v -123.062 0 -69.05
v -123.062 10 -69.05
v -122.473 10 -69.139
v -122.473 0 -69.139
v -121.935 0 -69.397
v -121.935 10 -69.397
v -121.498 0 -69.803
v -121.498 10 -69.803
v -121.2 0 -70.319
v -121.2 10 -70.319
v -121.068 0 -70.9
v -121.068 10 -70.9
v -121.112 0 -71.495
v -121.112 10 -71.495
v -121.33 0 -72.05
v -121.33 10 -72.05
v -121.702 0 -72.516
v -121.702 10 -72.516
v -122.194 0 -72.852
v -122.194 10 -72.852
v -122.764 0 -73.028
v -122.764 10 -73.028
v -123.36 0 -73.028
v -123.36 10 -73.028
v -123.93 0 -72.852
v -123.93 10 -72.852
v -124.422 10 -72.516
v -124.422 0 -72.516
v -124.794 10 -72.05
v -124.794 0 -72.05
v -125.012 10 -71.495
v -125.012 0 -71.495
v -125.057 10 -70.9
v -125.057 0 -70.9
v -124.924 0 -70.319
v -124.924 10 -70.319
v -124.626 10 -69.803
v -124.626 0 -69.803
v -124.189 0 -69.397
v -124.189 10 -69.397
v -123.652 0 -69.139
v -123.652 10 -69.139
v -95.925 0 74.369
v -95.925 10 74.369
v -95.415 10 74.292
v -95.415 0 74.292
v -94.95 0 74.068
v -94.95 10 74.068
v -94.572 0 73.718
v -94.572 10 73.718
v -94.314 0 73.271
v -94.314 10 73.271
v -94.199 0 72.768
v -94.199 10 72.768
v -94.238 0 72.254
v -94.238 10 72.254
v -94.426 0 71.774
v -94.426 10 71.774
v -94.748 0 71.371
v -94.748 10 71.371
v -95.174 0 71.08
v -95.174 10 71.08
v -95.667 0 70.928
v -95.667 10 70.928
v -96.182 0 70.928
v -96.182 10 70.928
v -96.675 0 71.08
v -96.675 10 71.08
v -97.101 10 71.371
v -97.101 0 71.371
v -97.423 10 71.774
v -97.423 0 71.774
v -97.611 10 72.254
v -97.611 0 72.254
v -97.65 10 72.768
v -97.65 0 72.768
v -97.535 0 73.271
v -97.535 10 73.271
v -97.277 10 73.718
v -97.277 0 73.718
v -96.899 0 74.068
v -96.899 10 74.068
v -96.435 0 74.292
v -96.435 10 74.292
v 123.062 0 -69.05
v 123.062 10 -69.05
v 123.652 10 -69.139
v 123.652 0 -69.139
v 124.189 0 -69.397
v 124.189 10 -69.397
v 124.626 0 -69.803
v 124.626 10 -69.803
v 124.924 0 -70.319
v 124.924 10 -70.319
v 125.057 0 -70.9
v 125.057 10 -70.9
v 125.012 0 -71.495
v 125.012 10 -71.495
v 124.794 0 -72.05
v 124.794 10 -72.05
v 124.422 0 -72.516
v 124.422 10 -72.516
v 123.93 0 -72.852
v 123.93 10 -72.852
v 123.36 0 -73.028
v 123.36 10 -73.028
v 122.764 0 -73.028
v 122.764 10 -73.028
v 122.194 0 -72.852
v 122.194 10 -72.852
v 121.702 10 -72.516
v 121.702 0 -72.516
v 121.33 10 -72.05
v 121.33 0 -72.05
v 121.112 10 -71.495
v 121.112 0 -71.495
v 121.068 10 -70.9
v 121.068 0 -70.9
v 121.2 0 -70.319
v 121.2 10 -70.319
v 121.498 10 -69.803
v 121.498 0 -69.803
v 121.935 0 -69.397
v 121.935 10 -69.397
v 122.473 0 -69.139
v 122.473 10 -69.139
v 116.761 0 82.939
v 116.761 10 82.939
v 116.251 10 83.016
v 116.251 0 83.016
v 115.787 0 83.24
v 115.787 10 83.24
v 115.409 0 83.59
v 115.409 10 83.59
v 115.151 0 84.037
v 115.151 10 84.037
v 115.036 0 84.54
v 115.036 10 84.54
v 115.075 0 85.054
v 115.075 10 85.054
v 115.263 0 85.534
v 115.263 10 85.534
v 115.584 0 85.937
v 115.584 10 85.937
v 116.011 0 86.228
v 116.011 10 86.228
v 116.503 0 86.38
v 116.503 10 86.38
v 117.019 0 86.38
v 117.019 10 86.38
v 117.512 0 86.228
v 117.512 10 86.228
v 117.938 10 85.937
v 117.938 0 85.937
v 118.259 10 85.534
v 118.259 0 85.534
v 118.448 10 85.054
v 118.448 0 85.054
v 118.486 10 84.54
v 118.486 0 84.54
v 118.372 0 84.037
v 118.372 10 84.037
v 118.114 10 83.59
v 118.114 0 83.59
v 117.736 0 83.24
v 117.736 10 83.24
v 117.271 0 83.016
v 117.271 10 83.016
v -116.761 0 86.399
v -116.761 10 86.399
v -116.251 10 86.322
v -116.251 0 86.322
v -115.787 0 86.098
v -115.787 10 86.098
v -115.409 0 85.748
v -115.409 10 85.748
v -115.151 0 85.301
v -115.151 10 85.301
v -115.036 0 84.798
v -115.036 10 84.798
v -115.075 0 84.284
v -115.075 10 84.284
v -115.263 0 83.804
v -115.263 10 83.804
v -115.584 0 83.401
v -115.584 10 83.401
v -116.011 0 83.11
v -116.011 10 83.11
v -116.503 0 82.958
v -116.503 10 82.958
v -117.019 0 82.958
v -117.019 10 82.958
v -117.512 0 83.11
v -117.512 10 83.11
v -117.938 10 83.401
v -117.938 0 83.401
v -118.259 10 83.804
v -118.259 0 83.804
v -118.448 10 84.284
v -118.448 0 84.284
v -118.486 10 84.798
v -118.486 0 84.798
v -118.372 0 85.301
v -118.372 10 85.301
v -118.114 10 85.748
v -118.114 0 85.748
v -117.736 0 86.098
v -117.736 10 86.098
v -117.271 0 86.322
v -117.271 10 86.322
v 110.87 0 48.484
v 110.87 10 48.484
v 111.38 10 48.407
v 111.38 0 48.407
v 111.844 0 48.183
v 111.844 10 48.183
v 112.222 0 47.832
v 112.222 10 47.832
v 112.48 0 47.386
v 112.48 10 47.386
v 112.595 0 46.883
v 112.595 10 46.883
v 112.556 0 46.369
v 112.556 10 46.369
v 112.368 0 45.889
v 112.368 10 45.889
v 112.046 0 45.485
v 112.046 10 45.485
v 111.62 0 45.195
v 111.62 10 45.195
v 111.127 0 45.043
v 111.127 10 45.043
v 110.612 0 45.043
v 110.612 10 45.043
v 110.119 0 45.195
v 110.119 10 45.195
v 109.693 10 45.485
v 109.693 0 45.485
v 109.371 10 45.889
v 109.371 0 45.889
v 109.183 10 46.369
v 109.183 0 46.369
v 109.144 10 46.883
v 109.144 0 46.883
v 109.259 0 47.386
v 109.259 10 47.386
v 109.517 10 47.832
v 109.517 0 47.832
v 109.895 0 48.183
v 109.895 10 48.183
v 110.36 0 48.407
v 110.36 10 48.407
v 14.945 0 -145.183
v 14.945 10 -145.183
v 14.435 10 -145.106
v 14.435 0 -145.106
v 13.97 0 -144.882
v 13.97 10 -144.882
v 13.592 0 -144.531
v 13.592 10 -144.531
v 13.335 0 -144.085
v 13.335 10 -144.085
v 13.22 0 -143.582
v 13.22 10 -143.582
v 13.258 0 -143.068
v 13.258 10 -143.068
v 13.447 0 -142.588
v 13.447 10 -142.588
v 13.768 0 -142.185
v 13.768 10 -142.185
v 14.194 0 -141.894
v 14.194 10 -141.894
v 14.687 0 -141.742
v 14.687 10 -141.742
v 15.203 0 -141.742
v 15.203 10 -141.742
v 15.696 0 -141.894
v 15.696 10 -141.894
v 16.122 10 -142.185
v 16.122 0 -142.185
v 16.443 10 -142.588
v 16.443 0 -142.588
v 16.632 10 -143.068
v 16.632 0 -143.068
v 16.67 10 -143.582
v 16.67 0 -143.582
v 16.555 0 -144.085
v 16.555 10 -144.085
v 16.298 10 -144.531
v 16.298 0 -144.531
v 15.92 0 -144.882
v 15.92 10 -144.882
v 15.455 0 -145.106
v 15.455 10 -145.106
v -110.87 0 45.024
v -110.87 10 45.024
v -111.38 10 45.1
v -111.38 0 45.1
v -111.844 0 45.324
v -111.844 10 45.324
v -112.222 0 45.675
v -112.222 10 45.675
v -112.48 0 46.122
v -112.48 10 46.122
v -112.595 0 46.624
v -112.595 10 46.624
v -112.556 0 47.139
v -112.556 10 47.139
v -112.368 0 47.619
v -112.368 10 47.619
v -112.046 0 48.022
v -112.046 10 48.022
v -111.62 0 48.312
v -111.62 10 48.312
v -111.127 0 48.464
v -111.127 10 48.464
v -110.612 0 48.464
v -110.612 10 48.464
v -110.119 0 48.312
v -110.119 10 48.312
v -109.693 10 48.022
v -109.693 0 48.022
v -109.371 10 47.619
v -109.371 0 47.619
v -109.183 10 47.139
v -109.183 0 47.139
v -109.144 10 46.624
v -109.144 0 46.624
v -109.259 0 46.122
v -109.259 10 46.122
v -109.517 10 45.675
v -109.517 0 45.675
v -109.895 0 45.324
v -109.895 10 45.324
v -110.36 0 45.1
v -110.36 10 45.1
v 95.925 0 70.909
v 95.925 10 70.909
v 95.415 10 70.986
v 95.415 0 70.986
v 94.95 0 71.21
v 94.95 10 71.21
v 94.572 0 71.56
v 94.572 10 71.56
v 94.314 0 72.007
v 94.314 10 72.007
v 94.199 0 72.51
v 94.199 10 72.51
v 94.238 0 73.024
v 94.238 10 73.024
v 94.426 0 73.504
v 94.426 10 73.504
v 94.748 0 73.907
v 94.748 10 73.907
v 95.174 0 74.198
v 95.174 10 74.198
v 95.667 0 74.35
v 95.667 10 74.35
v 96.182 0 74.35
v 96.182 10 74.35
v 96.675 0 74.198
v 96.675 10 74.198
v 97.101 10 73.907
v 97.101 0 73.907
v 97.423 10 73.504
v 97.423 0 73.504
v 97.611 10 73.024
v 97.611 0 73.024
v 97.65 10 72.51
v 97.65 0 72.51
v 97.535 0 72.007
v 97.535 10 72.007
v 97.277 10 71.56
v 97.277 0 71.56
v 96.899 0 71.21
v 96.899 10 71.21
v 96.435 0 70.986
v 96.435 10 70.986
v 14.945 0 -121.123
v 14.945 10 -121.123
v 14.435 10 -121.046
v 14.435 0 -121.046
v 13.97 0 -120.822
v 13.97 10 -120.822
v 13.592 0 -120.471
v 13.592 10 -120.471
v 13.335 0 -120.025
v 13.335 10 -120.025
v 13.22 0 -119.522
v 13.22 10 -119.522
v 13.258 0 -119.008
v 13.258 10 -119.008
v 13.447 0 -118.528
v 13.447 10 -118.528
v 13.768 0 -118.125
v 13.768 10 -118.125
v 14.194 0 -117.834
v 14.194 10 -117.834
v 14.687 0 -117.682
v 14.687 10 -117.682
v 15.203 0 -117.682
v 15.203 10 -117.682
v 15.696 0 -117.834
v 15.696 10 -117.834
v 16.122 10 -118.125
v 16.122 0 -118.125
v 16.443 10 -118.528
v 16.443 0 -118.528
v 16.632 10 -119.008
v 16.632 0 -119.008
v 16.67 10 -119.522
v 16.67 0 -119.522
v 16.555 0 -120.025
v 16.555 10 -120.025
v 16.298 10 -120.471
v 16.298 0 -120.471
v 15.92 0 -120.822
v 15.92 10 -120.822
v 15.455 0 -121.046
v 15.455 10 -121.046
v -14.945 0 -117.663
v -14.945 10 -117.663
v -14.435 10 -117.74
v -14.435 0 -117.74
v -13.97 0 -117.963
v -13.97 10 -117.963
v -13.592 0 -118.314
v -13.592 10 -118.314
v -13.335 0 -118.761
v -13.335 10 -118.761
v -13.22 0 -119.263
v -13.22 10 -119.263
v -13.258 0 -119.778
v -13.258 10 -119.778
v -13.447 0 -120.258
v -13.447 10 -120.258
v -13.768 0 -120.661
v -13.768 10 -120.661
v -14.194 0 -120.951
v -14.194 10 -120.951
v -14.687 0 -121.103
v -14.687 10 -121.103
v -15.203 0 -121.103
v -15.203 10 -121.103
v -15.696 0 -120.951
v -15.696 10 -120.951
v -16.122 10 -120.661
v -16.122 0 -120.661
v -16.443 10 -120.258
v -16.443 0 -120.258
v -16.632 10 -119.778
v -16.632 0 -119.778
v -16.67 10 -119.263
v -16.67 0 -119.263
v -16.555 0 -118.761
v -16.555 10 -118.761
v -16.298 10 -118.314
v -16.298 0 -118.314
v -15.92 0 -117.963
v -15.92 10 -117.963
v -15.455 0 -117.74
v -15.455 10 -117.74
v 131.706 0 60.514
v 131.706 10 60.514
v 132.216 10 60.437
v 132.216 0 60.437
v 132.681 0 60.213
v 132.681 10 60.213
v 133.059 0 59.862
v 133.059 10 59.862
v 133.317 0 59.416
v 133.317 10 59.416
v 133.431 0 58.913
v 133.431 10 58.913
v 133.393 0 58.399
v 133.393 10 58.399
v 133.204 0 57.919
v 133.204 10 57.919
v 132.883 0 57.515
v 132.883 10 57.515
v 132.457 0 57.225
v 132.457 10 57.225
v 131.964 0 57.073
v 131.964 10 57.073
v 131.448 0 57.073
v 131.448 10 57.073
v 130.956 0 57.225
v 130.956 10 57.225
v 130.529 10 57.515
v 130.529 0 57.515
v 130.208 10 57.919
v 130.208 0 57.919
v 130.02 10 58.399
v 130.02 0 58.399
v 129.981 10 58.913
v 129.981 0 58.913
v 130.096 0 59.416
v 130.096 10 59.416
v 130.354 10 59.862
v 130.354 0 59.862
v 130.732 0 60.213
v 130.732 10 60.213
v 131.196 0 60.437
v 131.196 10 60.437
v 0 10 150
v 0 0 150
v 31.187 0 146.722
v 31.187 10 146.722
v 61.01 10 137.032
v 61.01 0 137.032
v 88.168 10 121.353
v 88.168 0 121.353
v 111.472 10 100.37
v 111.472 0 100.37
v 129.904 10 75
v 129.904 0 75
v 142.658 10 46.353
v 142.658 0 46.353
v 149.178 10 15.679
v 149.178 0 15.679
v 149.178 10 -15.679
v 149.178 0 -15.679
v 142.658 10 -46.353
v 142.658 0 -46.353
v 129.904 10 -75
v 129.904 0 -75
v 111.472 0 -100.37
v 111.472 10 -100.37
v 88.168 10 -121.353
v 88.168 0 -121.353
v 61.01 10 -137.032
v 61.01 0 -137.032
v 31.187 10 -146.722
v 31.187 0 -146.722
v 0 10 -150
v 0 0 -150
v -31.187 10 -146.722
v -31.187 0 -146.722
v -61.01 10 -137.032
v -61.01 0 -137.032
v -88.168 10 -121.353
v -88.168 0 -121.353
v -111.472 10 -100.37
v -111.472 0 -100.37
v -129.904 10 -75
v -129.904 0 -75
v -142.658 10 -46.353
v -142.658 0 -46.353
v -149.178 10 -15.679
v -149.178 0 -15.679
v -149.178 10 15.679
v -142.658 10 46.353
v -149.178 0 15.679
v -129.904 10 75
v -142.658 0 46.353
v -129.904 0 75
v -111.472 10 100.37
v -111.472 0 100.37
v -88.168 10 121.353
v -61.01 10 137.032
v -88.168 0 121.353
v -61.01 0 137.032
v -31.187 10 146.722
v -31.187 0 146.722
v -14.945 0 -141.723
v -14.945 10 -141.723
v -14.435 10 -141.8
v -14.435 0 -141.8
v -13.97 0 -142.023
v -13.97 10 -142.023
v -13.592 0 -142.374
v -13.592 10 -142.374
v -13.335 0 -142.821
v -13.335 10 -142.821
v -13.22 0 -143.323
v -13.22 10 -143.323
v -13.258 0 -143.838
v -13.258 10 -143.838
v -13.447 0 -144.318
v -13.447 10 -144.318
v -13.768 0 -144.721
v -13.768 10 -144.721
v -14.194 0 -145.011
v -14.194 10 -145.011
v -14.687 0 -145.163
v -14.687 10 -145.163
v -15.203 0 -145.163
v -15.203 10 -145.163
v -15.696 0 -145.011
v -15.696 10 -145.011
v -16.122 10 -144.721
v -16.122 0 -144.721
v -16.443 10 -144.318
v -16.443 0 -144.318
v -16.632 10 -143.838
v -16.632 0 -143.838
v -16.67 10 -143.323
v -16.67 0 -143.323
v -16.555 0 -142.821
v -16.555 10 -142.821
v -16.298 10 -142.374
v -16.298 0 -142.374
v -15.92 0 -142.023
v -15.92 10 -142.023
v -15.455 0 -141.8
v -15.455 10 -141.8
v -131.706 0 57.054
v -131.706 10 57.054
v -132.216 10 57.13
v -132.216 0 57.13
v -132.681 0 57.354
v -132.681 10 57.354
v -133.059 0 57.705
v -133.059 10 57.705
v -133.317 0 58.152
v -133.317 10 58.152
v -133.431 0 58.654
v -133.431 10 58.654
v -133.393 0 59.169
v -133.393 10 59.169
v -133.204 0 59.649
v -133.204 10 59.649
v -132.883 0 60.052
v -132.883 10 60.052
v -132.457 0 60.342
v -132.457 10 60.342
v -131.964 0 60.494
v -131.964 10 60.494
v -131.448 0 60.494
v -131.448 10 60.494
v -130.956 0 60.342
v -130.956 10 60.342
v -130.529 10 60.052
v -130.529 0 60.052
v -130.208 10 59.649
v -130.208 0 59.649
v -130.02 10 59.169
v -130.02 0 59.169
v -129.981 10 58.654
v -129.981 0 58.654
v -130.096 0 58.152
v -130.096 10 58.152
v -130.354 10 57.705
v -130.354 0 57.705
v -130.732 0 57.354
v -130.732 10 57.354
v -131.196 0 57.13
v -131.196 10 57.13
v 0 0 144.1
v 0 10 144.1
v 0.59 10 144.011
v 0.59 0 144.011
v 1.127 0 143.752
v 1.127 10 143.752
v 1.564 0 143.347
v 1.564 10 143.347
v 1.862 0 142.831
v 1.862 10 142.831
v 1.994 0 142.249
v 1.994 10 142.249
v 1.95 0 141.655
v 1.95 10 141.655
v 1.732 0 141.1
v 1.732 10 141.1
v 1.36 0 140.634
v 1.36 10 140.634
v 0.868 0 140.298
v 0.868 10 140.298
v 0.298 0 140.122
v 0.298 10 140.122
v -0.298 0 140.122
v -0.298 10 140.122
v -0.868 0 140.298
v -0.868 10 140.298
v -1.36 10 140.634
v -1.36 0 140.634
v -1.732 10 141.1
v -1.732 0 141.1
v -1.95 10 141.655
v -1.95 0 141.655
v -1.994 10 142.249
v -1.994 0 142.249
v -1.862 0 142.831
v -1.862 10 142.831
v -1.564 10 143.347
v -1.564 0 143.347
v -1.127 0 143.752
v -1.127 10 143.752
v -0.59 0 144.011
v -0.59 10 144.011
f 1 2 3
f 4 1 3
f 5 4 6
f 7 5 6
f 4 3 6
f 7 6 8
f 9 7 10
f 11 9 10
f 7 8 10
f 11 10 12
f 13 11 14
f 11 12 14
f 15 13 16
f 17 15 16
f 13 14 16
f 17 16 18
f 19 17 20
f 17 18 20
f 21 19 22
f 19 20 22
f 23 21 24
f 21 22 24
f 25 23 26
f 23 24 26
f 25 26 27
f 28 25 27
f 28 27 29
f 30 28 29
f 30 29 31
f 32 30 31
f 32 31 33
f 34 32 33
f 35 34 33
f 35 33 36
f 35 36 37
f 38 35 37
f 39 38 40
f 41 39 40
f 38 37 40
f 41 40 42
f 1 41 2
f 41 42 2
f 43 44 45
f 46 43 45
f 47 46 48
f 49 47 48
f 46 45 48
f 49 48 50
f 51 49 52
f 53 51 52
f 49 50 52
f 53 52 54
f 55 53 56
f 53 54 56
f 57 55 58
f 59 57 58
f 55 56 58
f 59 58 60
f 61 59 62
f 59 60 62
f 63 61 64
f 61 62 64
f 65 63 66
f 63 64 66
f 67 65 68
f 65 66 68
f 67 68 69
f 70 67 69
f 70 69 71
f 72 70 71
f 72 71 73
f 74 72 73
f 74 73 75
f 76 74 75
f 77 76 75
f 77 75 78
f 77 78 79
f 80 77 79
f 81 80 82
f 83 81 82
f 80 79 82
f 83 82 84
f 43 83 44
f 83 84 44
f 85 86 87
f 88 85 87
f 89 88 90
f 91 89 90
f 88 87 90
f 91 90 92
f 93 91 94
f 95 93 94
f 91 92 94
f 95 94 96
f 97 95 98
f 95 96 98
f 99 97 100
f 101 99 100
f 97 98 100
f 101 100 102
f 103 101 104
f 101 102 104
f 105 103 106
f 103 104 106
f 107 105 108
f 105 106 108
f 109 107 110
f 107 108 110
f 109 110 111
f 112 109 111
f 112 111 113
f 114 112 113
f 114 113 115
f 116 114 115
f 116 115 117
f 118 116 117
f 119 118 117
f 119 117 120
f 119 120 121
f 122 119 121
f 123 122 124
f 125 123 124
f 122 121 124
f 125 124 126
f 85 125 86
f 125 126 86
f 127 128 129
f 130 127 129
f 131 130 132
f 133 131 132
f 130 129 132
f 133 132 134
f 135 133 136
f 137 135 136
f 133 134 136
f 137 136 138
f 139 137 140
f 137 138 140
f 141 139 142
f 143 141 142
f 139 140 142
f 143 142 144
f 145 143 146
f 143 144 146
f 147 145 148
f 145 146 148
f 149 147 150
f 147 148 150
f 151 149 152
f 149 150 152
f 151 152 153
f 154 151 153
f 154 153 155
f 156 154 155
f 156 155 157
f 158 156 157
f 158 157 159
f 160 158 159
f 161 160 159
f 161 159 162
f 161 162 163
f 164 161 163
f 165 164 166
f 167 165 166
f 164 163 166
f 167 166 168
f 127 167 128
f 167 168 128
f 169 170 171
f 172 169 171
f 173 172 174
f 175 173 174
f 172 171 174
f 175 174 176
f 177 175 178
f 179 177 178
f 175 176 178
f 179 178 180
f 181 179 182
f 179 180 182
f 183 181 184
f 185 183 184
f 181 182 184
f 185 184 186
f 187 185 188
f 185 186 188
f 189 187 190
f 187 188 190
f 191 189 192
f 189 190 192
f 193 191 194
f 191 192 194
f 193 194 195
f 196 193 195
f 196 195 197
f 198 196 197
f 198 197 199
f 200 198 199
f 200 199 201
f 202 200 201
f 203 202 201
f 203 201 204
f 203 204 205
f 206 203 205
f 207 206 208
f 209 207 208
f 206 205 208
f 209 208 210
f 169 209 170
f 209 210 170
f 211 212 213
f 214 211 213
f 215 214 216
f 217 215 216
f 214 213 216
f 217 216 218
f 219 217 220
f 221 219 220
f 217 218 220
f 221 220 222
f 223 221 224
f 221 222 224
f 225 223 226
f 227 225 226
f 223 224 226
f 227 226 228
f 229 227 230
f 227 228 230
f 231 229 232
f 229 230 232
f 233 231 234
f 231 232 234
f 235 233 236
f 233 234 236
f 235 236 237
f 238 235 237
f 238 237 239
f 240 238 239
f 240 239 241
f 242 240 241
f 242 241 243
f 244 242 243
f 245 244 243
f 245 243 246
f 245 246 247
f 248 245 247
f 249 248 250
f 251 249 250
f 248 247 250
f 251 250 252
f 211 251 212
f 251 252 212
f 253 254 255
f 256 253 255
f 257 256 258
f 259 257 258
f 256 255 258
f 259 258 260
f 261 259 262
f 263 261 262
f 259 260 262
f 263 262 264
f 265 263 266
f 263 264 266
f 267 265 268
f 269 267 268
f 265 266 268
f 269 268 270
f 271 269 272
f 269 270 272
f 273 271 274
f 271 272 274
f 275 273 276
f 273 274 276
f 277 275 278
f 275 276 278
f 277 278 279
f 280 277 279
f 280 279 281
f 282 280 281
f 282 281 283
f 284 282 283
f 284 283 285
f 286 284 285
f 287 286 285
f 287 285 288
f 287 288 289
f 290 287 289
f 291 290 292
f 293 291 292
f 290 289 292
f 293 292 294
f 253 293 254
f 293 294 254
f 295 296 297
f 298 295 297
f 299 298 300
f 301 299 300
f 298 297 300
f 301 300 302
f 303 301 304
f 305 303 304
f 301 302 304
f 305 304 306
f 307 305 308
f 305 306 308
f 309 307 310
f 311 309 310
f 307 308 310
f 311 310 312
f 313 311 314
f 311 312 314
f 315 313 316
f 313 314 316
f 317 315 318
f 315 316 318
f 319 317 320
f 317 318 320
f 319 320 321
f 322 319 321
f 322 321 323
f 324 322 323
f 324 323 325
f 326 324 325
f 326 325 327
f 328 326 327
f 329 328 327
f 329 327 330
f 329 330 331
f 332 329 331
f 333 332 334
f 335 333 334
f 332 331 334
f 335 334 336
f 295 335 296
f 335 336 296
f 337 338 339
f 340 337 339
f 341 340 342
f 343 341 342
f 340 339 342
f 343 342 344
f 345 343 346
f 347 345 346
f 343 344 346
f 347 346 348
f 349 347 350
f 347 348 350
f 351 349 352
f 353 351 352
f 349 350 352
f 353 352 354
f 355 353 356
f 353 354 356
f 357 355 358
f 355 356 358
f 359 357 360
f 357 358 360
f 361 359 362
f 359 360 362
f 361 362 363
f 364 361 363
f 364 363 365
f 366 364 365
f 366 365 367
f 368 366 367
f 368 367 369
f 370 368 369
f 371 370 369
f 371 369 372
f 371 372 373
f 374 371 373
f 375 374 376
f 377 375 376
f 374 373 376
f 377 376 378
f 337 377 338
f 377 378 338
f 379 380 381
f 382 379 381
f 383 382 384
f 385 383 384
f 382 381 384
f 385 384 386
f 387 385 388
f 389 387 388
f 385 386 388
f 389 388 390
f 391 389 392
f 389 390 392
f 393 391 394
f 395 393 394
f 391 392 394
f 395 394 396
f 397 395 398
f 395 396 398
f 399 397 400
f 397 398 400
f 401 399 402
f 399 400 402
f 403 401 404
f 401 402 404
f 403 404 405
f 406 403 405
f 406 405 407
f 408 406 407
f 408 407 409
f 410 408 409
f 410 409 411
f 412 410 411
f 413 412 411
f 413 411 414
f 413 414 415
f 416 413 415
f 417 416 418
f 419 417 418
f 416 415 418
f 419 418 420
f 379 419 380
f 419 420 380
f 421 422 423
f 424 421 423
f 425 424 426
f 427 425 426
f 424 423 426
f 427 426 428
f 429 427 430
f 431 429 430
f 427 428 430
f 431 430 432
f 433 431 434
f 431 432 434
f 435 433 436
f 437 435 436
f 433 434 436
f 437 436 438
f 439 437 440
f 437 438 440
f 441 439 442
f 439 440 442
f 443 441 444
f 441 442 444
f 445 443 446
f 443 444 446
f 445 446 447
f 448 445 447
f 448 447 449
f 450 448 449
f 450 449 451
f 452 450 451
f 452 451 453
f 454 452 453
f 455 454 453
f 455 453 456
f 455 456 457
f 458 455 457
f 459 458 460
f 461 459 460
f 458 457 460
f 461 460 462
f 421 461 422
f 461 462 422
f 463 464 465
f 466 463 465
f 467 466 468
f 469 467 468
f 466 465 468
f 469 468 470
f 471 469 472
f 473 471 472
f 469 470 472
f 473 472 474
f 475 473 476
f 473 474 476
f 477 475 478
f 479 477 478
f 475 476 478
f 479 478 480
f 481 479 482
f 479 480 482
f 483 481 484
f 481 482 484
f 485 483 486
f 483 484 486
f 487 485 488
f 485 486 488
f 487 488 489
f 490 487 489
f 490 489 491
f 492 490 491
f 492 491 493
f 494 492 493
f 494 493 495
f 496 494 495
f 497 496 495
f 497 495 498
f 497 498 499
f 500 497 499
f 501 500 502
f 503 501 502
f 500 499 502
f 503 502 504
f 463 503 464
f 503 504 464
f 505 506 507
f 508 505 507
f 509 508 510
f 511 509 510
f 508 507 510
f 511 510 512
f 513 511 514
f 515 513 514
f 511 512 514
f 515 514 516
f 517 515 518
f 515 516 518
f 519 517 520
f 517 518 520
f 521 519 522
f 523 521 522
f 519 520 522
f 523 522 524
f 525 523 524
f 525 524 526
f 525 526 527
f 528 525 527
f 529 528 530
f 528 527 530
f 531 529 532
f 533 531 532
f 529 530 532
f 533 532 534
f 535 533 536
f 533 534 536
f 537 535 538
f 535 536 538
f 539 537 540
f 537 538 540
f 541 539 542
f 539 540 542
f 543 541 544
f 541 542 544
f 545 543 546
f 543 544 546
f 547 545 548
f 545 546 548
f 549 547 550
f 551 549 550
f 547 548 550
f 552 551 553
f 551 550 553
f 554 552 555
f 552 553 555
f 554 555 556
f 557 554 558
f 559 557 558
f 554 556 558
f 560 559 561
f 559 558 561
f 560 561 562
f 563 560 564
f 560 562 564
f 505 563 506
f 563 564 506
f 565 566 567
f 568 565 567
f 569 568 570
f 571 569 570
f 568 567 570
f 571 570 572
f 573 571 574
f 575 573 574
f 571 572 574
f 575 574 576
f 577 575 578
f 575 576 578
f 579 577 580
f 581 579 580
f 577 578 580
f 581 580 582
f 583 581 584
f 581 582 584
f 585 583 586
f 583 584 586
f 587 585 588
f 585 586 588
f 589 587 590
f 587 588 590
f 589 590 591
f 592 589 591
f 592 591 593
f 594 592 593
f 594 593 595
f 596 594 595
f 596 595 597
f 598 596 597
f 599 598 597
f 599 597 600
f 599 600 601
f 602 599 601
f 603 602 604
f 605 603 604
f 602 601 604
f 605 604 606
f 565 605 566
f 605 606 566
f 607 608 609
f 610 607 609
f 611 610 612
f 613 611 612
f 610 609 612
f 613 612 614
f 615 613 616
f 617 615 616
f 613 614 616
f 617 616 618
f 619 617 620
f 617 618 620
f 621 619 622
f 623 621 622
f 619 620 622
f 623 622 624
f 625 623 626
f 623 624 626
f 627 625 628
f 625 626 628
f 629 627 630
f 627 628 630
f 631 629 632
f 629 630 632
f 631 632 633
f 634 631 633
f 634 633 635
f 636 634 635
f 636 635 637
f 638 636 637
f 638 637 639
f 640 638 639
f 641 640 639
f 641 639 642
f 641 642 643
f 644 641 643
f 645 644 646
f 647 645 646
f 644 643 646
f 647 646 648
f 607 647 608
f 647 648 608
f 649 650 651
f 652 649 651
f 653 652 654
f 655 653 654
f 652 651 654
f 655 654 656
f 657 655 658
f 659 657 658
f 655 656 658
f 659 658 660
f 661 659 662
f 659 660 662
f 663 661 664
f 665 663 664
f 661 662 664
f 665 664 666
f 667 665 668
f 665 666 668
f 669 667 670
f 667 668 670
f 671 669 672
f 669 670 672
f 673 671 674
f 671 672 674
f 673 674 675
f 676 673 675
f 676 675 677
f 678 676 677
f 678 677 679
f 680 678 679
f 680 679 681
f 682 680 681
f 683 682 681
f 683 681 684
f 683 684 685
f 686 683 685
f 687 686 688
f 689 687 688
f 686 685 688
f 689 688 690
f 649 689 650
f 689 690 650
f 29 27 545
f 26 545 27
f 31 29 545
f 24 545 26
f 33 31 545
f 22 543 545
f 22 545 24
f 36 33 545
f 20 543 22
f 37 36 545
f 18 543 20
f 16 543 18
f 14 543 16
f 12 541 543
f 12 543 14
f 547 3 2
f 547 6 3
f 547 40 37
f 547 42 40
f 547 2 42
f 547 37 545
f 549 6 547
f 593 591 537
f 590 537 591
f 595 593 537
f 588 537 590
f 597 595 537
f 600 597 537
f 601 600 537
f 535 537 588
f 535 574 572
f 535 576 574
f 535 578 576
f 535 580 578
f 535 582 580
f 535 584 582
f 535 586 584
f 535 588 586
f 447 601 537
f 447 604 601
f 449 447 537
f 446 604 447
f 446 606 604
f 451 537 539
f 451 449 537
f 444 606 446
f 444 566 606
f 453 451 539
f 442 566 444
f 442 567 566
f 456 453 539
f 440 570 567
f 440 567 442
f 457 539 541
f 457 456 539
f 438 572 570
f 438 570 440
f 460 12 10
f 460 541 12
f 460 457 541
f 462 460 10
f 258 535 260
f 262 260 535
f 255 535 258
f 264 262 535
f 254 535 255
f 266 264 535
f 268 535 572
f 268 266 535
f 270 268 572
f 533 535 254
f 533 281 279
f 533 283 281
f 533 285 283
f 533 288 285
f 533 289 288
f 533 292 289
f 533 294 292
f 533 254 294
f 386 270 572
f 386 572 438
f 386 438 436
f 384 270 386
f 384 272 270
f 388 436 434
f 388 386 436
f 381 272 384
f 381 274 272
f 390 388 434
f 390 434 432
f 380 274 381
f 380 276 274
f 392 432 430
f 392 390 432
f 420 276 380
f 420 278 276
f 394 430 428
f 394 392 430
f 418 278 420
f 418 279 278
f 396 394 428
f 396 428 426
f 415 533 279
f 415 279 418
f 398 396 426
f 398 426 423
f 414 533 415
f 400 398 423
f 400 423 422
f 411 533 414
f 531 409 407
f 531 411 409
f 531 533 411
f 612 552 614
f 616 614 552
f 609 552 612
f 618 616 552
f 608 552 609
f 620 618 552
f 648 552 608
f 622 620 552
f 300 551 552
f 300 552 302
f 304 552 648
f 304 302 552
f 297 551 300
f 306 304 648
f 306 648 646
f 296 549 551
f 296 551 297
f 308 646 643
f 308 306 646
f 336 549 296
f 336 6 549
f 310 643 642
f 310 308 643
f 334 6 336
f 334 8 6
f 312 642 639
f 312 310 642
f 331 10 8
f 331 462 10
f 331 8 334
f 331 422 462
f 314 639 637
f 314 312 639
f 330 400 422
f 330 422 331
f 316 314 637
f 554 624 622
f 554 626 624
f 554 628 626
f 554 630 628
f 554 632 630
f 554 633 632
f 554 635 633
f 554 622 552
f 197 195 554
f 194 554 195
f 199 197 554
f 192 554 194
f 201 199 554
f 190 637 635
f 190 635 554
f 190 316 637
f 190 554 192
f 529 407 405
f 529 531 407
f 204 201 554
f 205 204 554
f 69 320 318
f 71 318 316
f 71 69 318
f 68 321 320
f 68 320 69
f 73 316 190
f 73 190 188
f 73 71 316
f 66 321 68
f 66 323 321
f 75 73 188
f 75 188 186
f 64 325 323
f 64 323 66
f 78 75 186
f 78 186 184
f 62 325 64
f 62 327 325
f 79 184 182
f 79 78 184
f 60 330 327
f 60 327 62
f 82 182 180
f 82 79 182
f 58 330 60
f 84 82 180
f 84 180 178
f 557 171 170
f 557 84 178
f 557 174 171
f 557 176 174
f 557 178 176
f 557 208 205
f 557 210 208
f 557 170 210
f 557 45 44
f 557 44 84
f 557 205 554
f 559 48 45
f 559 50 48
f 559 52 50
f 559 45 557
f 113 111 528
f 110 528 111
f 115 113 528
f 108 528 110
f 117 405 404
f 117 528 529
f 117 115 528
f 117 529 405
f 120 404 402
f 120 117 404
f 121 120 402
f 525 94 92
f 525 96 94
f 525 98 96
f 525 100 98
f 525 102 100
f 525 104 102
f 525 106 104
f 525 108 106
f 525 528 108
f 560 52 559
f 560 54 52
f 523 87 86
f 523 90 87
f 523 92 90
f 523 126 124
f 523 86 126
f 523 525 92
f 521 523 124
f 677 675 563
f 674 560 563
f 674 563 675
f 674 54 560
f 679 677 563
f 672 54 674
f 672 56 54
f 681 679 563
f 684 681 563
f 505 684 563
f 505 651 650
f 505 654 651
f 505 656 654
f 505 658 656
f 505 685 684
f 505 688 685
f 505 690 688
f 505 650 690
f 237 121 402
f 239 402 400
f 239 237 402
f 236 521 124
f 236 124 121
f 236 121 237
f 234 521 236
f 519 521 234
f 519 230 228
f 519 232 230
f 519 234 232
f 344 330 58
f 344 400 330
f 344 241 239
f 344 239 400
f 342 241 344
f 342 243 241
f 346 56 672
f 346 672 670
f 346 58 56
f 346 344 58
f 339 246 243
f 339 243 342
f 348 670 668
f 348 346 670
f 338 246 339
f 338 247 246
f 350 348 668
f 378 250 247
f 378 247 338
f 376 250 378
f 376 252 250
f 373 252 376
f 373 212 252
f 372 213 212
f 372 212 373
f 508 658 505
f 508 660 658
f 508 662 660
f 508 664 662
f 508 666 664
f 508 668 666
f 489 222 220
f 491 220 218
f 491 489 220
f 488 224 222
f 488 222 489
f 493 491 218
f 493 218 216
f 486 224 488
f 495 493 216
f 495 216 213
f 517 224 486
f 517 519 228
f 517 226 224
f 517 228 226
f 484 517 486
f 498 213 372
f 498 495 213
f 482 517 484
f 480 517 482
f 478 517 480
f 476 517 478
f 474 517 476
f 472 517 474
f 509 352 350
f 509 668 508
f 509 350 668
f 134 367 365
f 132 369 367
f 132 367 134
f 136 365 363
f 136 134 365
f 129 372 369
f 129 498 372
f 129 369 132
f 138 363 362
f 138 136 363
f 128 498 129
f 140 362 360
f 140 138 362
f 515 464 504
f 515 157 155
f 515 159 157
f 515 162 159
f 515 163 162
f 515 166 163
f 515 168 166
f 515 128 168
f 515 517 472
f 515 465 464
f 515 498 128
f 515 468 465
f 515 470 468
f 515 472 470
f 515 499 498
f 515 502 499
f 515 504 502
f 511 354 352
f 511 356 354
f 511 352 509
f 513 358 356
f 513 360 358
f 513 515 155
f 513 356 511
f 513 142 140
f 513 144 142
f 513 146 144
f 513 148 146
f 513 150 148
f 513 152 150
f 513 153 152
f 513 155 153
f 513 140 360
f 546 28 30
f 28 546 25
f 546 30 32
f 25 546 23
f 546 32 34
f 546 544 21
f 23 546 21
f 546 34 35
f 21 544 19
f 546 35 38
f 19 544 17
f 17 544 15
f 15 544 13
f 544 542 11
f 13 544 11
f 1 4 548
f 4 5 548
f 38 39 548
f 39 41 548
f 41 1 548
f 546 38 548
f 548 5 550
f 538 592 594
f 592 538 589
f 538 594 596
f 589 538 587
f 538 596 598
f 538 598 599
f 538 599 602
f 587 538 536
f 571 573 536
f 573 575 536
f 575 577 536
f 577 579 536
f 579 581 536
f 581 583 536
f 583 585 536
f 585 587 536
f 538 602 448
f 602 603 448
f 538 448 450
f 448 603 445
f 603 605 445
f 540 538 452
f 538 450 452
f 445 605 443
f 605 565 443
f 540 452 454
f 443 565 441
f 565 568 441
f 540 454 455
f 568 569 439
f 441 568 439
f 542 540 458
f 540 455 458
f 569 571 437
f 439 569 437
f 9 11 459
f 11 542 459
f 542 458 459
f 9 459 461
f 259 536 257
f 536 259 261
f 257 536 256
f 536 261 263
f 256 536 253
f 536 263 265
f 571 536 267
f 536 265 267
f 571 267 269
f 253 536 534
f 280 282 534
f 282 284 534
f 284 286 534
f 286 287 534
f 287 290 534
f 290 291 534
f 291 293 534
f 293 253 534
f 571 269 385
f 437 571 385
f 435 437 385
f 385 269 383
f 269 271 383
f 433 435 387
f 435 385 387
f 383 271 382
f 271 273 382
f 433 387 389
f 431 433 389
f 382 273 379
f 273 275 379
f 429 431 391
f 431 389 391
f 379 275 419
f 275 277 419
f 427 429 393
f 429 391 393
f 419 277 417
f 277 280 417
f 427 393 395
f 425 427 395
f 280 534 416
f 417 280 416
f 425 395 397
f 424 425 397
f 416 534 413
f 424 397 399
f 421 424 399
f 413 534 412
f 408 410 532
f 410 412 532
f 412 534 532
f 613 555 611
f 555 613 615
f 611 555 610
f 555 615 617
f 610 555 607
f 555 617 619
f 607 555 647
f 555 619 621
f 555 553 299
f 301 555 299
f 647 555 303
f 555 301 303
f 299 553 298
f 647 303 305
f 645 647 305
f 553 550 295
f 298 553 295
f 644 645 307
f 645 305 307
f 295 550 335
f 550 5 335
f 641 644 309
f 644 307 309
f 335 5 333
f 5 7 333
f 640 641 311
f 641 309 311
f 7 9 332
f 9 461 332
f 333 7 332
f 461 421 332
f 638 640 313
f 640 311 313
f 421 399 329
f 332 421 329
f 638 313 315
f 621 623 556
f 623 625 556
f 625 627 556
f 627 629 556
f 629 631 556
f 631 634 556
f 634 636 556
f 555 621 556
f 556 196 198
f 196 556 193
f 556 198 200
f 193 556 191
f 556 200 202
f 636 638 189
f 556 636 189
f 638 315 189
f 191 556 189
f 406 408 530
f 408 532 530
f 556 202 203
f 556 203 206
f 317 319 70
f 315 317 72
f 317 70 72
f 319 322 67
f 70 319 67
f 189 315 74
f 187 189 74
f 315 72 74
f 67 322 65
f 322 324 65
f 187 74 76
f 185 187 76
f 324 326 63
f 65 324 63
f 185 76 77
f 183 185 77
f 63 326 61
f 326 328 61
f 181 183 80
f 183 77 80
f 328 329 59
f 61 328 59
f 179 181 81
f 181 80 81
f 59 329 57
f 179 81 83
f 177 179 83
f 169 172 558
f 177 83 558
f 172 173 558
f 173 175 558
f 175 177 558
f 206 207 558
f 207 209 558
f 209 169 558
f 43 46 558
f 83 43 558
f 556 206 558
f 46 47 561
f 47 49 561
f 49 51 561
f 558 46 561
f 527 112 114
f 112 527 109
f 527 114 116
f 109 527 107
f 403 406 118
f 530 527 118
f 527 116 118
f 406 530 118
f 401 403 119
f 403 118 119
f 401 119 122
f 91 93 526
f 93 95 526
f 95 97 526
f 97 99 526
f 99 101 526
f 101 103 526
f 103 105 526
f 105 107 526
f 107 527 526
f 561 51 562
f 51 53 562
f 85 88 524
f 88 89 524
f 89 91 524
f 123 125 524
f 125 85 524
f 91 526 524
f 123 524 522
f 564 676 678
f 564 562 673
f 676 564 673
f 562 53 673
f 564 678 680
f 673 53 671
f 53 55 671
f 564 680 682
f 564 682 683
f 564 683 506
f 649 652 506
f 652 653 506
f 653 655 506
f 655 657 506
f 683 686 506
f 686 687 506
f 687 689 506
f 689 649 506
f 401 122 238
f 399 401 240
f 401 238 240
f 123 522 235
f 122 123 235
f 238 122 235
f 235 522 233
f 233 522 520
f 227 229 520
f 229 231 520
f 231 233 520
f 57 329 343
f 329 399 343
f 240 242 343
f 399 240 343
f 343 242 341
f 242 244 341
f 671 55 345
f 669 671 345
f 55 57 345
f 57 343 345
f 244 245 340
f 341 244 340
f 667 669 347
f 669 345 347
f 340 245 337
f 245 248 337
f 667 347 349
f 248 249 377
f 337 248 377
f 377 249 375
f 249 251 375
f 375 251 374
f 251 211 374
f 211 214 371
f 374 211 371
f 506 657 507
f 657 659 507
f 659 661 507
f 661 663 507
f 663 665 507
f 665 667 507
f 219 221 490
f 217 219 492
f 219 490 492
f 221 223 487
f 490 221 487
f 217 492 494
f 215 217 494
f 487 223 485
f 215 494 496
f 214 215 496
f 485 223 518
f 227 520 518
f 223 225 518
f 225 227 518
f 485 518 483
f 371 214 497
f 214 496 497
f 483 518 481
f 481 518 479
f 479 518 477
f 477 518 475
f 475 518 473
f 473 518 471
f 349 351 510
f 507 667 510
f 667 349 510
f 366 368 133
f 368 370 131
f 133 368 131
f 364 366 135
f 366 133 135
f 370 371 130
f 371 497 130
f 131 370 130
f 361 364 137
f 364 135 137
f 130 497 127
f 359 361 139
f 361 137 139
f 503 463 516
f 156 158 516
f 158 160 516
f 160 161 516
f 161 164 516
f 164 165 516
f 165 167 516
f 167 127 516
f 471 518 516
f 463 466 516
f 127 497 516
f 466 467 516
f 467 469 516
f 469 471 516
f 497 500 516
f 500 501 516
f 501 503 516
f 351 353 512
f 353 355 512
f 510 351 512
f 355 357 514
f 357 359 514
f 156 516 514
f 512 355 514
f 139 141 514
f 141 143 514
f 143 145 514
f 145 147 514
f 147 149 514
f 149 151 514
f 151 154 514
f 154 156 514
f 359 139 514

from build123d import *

# Parameters (mm, degrees)
SKETCH1_R           = 150
BOSS_EXTRUDE1_DEPTH = 10
SKETCH2_R           = 1.73
SKETCH2_R_2         = 2
CUT_EXTRUDE1_DEPTH  = 10


with BuildPart() as part:
    # Sketch1 → Boss-Extrude1 (new body)
    with BuildSketch(Plane(origin=(0, 0, 0), x_dir=(1, 0, 0), z_dir=(0, 1, 0))):
        with Locations(Location((0, 0, 0), (0, 0, 270))):
            Circle(SKETCH1_R)
    extrude(amount=BOSS_EXTRUDE1_DEPTH)

    # Sketch2 → Cut-Extrude1 (cut)
    with BuildSketch(Plane(origin=(0, 10, 0), x_dir=(1, 0, 0), z_dir=(0, 1, 0))):
        with Locations(Location((-14.945, 143.452697854, 0), (0, 0, 270))):
            Circle(SKETCH2_R)
        with Locations(Location((-14.945, 119.392697854, 0), (0, 0, 270))):
            Circle(SKETCH2_R)
        with Locations(Location((14.945, 143.452697854, 0), (0, 0, 90))):
            Circle(SKETCH2_R)
        with Locations(Location((14.945, 119.392697854, 0), (0, 0, 90))):
            Circle(SKETCH2_R)
        with Locations(Location((95.924609368, -72.639098587, 0), (0, 0, 90))):
            Circle(SKETCH2_R)
        with Locations(Location((116.761180583, -84.669098587, 0), (0, 0, 90))):
            Circle(SKETCH2_R)
        with Locations(Location((131.706180583, -58.783599268, 0), (0, 0, 270))):
            Circle(SKETCH2_R)
        with Locations(Location((110.869609368, -46.753599268, 0), (0, 0, 270))):
            Circle(SKETCH2_R)
        with Locations(Location((-110.869609368, -46.753599268, 0), (0, 0, 90))):
            Circle(SKETCH2_R)
        with Locations(Location((-131.706180583, -58.783599268, 0), (0, 0, 90))):
            Circle(SKETCH2_R)
        with Locations(Location((-116.761180583, -84.669098587, 0), (0, 0, 270))):
            Circle(SKETCH2_R)
        with Locations(Location((-95.924609368, -72.639098587, 0), (0, 0, 270))):
            Circle(SKETCH2_R)
        with Locations(Location((-123.062136008, 71.049957351, 0), (0, 0, 270))):
            Circle(SKETCH2_R_2)
        with Locations(Location((123.062136008, 71.049957351, 0), (0, 0, 270))):
            Circle(SKETCH2_R_2)
        with Locations(Location((0, -142.099914702, 0), (0, 0, 270))):
            Circle(SKETCH2_R_2)
    extrude(amount=-CUT_EXTRUDE1_DEPTH, mode=Mode.SUBTRACT)


solid = part.part
